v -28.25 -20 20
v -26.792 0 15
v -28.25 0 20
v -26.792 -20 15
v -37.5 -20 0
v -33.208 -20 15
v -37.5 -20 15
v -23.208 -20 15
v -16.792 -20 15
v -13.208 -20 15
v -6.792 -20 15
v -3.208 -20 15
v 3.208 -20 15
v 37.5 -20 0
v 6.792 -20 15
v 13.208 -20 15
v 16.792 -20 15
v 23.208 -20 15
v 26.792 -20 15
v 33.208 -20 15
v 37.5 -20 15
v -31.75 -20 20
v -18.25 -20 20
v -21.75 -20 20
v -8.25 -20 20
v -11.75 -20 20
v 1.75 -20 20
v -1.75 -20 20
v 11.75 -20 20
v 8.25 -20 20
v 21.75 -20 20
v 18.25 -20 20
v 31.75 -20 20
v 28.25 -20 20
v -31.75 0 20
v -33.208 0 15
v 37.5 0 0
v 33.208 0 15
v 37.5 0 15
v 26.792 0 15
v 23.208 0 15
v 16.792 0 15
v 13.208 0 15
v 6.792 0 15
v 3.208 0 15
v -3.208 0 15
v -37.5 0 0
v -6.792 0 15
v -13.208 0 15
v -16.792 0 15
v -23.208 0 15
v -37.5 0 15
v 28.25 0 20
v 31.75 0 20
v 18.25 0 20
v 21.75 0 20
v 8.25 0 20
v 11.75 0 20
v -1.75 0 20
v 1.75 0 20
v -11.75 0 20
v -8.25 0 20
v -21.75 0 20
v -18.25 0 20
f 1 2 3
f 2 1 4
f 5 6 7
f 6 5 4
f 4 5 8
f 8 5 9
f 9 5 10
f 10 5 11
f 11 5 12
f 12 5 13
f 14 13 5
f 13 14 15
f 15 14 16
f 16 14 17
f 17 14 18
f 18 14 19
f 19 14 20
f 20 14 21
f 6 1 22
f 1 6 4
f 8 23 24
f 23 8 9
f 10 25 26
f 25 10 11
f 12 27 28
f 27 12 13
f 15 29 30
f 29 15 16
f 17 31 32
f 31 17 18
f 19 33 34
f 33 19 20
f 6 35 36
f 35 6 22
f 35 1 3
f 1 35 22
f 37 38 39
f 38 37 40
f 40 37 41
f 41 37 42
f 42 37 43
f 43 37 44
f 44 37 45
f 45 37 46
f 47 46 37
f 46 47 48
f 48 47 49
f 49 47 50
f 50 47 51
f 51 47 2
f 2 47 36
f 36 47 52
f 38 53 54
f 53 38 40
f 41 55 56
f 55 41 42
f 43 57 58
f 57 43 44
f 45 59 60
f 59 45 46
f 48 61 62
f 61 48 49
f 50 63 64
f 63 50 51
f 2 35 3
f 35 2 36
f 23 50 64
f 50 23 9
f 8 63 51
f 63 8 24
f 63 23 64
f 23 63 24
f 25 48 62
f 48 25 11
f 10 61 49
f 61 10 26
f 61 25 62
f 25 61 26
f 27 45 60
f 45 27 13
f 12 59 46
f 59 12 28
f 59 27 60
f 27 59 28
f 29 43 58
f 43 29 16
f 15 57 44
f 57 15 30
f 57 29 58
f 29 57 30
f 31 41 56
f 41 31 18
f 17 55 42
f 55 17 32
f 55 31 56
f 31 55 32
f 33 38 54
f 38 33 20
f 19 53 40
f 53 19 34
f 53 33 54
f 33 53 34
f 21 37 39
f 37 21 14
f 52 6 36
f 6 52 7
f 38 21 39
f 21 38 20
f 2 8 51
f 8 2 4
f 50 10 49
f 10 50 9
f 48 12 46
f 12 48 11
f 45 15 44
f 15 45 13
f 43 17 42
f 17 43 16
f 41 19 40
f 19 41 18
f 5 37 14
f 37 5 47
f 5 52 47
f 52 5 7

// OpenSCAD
$fn = 32;

// ----------------------------------------------------------------------
// Toothed rack, 7 teeth
// 10 mm pitch, 5 mm teeth
// ----------------------------------------------------------------------

// --- parameters (mm) ---
bar_w = 20;     // bar width (Y)
bar_h = 15;     // bar height (Z)
teeth = 7;      // number of teeth
pitch = 10;     // tooth pitch
tooth_h = 5;    // tooth height above the bar
root_w = 7;     // tooth width at the root
crest_w = 3.5;  // tooth width at the crest

// --- derived feature positions (mm) ---
span = (teeth - 1) * pitch;  // = 60   distance between the outer teeth
bar_l = span + root_w + 8;   // = 75   bar length: teeth plus 4 mm at each end
tooth_x = -span / 2;         // = -30   X of the first tooth
height = bar_h + tooth_h;    // = 20   overall height
feature_centers = [
  [tooth_x + 0 * pitch, -bar_w / 2],
  [tooth_x + 1 * pitch, -bar_w / 2],
  [tooth_x + 2 * pitch, -bar_w / 2],
  [tooth_x + 3 * pitch, -bar_w / 2],
  [tooth_x + 4 * pitch, -bar_w / 2],
  [tooth_x + 5 * pitch, -bar_w / 2],
  [tooth_x + 6 * pitch, -bar_w / 2]
];   // tooth centre line, drives the tooth loop

// bar with a rack of teeth, one extruded trapezoium per centre
module rack_tooth() {
  linear_extrude(height = bar_w)
    polygon(points = [
      [0, 0],
      [root_w, 0],
      [root_w / 2 + crest_w / 2, tooth_h + 1],
      [root_w / 2 - crest_w / 2, tooth_h + 1]
    ]);
}

union() {
  translate([-bar_l / 2, -bar_w, 0]) cube([bar_l, bar_w, bar_h]);
  for (centre = feature_centers)
    translate([centre[0] - root_w / 2, 0, bar_h - 1]) rotate([90, 0, 0]) rack_tooth();
}
